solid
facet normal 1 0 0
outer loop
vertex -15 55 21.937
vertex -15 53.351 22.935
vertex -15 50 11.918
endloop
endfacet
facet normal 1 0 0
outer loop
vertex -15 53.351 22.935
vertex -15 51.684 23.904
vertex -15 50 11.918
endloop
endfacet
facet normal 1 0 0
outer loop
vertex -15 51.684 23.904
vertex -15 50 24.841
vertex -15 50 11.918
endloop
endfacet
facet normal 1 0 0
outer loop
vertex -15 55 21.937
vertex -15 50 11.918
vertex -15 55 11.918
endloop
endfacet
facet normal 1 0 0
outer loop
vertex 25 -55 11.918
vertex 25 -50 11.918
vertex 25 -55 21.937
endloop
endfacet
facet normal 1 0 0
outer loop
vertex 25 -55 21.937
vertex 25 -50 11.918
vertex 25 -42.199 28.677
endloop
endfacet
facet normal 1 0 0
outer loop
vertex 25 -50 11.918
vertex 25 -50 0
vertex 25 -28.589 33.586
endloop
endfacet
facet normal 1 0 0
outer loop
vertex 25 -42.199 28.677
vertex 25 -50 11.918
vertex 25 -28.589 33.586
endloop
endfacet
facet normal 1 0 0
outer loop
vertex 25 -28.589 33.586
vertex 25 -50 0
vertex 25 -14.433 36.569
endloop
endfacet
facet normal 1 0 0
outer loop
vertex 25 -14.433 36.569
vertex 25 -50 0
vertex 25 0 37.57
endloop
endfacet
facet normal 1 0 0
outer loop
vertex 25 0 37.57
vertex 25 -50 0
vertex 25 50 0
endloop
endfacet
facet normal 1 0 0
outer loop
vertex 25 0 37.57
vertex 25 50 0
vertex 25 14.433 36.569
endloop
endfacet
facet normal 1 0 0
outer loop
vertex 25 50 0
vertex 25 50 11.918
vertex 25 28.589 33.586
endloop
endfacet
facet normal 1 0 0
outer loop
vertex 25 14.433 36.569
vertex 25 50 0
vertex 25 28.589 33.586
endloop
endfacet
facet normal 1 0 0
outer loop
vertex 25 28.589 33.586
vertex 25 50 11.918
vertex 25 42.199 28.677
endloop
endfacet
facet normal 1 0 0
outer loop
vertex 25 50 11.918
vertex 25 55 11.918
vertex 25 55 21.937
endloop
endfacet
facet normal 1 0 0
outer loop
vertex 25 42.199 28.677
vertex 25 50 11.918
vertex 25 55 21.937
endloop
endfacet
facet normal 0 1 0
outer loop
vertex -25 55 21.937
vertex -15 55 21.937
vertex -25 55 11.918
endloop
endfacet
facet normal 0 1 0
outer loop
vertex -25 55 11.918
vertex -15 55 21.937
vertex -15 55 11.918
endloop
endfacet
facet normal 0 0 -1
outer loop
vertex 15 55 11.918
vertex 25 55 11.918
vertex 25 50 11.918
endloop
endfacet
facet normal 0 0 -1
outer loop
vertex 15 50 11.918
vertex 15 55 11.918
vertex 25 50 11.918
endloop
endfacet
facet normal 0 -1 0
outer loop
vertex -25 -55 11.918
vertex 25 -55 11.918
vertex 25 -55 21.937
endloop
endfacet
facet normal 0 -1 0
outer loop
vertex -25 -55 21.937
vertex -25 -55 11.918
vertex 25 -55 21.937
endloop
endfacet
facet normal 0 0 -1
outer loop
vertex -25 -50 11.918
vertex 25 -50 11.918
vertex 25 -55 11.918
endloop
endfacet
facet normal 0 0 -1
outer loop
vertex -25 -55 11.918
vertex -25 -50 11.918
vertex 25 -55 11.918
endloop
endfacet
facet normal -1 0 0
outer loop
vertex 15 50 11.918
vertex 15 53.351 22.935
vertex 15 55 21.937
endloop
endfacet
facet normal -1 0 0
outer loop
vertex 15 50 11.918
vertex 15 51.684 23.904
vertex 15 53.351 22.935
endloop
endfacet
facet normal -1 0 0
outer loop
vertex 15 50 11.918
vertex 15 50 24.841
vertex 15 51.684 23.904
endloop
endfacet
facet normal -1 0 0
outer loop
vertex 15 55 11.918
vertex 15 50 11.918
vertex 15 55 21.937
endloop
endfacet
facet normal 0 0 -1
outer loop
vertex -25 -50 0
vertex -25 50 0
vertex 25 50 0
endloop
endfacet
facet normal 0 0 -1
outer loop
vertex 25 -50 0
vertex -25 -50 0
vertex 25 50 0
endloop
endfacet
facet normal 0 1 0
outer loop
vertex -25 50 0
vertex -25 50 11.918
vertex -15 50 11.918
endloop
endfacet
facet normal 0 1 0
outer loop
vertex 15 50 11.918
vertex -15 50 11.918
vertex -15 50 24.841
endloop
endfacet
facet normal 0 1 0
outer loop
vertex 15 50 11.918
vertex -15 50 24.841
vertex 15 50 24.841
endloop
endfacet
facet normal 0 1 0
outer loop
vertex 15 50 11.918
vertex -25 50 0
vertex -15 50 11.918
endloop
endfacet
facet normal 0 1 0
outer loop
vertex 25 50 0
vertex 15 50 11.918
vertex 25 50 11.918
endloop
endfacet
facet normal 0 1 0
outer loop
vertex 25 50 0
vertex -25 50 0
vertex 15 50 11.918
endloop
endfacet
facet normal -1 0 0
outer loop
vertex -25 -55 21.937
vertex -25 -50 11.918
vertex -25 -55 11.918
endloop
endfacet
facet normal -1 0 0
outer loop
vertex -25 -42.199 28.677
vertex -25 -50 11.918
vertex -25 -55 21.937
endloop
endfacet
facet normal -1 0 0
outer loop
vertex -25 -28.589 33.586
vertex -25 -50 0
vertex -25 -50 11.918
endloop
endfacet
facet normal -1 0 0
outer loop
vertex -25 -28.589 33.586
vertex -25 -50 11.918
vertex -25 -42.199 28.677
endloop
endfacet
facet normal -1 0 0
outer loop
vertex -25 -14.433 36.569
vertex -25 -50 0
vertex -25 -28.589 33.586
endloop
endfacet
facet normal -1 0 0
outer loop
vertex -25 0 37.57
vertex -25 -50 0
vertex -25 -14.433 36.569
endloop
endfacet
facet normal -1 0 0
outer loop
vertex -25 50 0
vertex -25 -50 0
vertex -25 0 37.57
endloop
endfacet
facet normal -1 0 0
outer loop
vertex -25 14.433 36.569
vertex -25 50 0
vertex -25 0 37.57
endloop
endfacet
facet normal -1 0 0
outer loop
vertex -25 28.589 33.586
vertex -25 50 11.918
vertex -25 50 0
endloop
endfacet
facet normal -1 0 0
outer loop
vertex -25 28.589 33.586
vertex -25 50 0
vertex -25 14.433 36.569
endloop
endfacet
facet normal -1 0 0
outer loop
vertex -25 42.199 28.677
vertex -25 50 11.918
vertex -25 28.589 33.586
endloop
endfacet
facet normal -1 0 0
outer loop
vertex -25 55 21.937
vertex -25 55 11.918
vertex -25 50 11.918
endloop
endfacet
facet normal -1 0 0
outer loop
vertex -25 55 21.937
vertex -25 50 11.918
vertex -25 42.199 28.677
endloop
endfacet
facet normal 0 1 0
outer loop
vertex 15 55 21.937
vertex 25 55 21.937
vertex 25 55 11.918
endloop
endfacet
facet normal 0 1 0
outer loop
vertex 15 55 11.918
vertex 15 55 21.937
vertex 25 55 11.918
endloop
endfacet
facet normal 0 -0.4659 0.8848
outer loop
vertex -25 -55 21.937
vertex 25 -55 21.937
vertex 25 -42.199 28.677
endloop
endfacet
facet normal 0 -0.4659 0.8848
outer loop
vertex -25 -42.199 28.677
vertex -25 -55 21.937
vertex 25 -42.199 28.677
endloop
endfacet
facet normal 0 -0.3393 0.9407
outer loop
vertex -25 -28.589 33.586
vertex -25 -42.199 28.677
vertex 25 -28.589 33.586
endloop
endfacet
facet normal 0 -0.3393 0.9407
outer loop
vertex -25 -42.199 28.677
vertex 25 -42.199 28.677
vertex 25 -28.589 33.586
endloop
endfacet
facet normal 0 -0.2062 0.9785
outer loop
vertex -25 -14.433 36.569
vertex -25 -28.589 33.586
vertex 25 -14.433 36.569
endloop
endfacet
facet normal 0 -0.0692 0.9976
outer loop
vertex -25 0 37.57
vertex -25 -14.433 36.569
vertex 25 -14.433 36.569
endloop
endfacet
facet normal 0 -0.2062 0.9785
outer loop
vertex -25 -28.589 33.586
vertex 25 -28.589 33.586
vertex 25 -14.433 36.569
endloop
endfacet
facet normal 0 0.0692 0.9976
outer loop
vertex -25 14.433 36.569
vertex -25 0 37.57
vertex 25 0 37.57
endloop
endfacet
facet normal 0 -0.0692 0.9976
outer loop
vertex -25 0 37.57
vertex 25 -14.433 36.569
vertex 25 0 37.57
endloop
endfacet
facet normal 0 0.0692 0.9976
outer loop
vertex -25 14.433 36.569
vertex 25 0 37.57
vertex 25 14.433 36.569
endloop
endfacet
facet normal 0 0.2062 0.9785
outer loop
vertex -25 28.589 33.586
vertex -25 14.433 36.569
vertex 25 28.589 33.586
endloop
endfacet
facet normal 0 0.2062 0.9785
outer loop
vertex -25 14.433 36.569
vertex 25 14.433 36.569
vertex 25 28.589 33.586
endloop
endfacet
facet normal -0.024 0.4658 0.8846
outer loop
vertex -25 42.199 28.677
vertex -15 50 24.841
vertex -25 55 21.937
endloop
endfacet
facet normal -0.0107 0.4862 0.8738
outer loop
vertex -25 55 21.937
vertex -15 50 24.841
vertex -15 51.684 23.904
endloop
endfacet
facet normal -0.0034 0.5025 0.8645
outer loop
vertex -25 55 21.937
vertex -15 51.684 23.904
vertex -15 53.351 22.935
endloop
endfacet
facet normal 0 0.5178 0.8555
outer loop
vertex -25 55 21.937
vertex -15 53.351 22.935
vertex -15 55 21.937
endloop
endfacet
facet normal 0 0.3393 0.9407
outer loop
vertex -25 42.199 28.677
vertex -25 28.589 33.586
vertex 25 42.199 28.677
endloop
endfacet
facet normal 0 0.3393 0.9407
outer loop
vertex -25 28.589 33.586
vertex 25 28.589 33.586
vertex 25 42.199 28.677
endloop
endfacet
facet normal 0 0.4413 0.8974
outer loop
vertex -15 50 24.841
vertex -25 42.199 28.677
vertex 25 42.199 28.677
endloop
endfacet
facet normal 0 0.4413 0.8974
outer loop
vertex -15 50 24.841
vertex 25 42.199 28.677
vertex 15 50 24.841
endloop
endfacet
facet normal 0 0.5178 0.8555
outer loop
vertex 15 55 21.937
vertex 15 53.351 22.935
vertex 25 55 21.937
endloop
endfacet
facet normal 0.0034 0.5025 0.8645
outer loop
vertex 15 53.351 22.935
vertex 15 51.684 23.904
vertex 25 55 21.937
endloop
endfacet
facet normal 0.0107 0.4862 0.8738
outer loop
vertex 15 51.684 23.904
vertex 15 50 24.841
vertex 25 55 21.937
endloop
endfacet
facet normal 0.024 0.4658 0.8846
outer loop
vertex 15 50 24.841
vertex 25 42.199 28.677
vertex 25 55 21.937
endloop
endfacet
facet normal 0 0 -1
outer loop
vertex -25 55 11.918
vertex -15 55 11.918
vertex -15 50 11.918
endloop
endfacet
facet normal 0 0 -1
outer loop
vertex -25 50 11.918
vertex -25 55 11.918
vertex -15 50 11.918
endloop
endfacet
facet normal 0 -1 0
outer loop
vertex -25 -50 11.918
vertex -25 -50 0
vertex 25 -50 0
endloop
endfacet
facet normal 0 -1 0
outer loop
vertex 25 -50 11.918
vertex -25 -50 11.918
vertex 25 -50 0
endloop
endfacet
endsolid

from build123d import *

# Parameters (mm, degrees)
SKETCH1_W           = 50
SKETCH1_H           = 100
BOSS_EXTRUDE1_DEPTH = 20
BOSS_EXTRUDE2_DEPTH = 50
SKETCH3_W           = 30
SKETCH3_H           = 5
CUT_EXTRUDE1_DEPTH  = 30


with BuildPart() as part:
    # Sketch1 → Boss-Extrude1 (new body)
    with BuildSketch(Plane.XY):
        Rectangle(SKETCH1_W, SKETCH1_H)
    extrude(amount=BOSS_EXTRUDE1_DEPTH)

    # Sketch2 → Boss-Extrude2 (add, through all)
    with BuildSketch(Plane(origin=(25, 0, 0), x_dir=(0, 0, -1), z_dir=(1, 0, 0))):
        with BuildLine():
            Line((-11.918313109, 55), (-11.918313109, -55))
            Line((-11.918313109, -55), (-21.936720316, -55))
            ThreePointArc((-21.936720316, -55), (-37.569706847, 0), (-21.936720316, 55))
            Line((-21.936720316, 55), (-11.918313109, 55))
        make_face()
    extrude(amount=-BOSS_EXTRUDE2_DEPTH)

    # Sketch3 → Cut-Extrude1 (cut)
    with BuildSketch(Plane(origin=(0, 0, 0), x_dir=(-1, 0, 0), z_dir=(0, 0, -1))):
        with Locations((0, 52.5)):
            Rectangle(SKETCH3_W, SKETCH3_H)
    extrude(amount=-CUT_EXTRUDE1_DEPTH, mode=Mode.SUBTRACT)


solid = part.part
